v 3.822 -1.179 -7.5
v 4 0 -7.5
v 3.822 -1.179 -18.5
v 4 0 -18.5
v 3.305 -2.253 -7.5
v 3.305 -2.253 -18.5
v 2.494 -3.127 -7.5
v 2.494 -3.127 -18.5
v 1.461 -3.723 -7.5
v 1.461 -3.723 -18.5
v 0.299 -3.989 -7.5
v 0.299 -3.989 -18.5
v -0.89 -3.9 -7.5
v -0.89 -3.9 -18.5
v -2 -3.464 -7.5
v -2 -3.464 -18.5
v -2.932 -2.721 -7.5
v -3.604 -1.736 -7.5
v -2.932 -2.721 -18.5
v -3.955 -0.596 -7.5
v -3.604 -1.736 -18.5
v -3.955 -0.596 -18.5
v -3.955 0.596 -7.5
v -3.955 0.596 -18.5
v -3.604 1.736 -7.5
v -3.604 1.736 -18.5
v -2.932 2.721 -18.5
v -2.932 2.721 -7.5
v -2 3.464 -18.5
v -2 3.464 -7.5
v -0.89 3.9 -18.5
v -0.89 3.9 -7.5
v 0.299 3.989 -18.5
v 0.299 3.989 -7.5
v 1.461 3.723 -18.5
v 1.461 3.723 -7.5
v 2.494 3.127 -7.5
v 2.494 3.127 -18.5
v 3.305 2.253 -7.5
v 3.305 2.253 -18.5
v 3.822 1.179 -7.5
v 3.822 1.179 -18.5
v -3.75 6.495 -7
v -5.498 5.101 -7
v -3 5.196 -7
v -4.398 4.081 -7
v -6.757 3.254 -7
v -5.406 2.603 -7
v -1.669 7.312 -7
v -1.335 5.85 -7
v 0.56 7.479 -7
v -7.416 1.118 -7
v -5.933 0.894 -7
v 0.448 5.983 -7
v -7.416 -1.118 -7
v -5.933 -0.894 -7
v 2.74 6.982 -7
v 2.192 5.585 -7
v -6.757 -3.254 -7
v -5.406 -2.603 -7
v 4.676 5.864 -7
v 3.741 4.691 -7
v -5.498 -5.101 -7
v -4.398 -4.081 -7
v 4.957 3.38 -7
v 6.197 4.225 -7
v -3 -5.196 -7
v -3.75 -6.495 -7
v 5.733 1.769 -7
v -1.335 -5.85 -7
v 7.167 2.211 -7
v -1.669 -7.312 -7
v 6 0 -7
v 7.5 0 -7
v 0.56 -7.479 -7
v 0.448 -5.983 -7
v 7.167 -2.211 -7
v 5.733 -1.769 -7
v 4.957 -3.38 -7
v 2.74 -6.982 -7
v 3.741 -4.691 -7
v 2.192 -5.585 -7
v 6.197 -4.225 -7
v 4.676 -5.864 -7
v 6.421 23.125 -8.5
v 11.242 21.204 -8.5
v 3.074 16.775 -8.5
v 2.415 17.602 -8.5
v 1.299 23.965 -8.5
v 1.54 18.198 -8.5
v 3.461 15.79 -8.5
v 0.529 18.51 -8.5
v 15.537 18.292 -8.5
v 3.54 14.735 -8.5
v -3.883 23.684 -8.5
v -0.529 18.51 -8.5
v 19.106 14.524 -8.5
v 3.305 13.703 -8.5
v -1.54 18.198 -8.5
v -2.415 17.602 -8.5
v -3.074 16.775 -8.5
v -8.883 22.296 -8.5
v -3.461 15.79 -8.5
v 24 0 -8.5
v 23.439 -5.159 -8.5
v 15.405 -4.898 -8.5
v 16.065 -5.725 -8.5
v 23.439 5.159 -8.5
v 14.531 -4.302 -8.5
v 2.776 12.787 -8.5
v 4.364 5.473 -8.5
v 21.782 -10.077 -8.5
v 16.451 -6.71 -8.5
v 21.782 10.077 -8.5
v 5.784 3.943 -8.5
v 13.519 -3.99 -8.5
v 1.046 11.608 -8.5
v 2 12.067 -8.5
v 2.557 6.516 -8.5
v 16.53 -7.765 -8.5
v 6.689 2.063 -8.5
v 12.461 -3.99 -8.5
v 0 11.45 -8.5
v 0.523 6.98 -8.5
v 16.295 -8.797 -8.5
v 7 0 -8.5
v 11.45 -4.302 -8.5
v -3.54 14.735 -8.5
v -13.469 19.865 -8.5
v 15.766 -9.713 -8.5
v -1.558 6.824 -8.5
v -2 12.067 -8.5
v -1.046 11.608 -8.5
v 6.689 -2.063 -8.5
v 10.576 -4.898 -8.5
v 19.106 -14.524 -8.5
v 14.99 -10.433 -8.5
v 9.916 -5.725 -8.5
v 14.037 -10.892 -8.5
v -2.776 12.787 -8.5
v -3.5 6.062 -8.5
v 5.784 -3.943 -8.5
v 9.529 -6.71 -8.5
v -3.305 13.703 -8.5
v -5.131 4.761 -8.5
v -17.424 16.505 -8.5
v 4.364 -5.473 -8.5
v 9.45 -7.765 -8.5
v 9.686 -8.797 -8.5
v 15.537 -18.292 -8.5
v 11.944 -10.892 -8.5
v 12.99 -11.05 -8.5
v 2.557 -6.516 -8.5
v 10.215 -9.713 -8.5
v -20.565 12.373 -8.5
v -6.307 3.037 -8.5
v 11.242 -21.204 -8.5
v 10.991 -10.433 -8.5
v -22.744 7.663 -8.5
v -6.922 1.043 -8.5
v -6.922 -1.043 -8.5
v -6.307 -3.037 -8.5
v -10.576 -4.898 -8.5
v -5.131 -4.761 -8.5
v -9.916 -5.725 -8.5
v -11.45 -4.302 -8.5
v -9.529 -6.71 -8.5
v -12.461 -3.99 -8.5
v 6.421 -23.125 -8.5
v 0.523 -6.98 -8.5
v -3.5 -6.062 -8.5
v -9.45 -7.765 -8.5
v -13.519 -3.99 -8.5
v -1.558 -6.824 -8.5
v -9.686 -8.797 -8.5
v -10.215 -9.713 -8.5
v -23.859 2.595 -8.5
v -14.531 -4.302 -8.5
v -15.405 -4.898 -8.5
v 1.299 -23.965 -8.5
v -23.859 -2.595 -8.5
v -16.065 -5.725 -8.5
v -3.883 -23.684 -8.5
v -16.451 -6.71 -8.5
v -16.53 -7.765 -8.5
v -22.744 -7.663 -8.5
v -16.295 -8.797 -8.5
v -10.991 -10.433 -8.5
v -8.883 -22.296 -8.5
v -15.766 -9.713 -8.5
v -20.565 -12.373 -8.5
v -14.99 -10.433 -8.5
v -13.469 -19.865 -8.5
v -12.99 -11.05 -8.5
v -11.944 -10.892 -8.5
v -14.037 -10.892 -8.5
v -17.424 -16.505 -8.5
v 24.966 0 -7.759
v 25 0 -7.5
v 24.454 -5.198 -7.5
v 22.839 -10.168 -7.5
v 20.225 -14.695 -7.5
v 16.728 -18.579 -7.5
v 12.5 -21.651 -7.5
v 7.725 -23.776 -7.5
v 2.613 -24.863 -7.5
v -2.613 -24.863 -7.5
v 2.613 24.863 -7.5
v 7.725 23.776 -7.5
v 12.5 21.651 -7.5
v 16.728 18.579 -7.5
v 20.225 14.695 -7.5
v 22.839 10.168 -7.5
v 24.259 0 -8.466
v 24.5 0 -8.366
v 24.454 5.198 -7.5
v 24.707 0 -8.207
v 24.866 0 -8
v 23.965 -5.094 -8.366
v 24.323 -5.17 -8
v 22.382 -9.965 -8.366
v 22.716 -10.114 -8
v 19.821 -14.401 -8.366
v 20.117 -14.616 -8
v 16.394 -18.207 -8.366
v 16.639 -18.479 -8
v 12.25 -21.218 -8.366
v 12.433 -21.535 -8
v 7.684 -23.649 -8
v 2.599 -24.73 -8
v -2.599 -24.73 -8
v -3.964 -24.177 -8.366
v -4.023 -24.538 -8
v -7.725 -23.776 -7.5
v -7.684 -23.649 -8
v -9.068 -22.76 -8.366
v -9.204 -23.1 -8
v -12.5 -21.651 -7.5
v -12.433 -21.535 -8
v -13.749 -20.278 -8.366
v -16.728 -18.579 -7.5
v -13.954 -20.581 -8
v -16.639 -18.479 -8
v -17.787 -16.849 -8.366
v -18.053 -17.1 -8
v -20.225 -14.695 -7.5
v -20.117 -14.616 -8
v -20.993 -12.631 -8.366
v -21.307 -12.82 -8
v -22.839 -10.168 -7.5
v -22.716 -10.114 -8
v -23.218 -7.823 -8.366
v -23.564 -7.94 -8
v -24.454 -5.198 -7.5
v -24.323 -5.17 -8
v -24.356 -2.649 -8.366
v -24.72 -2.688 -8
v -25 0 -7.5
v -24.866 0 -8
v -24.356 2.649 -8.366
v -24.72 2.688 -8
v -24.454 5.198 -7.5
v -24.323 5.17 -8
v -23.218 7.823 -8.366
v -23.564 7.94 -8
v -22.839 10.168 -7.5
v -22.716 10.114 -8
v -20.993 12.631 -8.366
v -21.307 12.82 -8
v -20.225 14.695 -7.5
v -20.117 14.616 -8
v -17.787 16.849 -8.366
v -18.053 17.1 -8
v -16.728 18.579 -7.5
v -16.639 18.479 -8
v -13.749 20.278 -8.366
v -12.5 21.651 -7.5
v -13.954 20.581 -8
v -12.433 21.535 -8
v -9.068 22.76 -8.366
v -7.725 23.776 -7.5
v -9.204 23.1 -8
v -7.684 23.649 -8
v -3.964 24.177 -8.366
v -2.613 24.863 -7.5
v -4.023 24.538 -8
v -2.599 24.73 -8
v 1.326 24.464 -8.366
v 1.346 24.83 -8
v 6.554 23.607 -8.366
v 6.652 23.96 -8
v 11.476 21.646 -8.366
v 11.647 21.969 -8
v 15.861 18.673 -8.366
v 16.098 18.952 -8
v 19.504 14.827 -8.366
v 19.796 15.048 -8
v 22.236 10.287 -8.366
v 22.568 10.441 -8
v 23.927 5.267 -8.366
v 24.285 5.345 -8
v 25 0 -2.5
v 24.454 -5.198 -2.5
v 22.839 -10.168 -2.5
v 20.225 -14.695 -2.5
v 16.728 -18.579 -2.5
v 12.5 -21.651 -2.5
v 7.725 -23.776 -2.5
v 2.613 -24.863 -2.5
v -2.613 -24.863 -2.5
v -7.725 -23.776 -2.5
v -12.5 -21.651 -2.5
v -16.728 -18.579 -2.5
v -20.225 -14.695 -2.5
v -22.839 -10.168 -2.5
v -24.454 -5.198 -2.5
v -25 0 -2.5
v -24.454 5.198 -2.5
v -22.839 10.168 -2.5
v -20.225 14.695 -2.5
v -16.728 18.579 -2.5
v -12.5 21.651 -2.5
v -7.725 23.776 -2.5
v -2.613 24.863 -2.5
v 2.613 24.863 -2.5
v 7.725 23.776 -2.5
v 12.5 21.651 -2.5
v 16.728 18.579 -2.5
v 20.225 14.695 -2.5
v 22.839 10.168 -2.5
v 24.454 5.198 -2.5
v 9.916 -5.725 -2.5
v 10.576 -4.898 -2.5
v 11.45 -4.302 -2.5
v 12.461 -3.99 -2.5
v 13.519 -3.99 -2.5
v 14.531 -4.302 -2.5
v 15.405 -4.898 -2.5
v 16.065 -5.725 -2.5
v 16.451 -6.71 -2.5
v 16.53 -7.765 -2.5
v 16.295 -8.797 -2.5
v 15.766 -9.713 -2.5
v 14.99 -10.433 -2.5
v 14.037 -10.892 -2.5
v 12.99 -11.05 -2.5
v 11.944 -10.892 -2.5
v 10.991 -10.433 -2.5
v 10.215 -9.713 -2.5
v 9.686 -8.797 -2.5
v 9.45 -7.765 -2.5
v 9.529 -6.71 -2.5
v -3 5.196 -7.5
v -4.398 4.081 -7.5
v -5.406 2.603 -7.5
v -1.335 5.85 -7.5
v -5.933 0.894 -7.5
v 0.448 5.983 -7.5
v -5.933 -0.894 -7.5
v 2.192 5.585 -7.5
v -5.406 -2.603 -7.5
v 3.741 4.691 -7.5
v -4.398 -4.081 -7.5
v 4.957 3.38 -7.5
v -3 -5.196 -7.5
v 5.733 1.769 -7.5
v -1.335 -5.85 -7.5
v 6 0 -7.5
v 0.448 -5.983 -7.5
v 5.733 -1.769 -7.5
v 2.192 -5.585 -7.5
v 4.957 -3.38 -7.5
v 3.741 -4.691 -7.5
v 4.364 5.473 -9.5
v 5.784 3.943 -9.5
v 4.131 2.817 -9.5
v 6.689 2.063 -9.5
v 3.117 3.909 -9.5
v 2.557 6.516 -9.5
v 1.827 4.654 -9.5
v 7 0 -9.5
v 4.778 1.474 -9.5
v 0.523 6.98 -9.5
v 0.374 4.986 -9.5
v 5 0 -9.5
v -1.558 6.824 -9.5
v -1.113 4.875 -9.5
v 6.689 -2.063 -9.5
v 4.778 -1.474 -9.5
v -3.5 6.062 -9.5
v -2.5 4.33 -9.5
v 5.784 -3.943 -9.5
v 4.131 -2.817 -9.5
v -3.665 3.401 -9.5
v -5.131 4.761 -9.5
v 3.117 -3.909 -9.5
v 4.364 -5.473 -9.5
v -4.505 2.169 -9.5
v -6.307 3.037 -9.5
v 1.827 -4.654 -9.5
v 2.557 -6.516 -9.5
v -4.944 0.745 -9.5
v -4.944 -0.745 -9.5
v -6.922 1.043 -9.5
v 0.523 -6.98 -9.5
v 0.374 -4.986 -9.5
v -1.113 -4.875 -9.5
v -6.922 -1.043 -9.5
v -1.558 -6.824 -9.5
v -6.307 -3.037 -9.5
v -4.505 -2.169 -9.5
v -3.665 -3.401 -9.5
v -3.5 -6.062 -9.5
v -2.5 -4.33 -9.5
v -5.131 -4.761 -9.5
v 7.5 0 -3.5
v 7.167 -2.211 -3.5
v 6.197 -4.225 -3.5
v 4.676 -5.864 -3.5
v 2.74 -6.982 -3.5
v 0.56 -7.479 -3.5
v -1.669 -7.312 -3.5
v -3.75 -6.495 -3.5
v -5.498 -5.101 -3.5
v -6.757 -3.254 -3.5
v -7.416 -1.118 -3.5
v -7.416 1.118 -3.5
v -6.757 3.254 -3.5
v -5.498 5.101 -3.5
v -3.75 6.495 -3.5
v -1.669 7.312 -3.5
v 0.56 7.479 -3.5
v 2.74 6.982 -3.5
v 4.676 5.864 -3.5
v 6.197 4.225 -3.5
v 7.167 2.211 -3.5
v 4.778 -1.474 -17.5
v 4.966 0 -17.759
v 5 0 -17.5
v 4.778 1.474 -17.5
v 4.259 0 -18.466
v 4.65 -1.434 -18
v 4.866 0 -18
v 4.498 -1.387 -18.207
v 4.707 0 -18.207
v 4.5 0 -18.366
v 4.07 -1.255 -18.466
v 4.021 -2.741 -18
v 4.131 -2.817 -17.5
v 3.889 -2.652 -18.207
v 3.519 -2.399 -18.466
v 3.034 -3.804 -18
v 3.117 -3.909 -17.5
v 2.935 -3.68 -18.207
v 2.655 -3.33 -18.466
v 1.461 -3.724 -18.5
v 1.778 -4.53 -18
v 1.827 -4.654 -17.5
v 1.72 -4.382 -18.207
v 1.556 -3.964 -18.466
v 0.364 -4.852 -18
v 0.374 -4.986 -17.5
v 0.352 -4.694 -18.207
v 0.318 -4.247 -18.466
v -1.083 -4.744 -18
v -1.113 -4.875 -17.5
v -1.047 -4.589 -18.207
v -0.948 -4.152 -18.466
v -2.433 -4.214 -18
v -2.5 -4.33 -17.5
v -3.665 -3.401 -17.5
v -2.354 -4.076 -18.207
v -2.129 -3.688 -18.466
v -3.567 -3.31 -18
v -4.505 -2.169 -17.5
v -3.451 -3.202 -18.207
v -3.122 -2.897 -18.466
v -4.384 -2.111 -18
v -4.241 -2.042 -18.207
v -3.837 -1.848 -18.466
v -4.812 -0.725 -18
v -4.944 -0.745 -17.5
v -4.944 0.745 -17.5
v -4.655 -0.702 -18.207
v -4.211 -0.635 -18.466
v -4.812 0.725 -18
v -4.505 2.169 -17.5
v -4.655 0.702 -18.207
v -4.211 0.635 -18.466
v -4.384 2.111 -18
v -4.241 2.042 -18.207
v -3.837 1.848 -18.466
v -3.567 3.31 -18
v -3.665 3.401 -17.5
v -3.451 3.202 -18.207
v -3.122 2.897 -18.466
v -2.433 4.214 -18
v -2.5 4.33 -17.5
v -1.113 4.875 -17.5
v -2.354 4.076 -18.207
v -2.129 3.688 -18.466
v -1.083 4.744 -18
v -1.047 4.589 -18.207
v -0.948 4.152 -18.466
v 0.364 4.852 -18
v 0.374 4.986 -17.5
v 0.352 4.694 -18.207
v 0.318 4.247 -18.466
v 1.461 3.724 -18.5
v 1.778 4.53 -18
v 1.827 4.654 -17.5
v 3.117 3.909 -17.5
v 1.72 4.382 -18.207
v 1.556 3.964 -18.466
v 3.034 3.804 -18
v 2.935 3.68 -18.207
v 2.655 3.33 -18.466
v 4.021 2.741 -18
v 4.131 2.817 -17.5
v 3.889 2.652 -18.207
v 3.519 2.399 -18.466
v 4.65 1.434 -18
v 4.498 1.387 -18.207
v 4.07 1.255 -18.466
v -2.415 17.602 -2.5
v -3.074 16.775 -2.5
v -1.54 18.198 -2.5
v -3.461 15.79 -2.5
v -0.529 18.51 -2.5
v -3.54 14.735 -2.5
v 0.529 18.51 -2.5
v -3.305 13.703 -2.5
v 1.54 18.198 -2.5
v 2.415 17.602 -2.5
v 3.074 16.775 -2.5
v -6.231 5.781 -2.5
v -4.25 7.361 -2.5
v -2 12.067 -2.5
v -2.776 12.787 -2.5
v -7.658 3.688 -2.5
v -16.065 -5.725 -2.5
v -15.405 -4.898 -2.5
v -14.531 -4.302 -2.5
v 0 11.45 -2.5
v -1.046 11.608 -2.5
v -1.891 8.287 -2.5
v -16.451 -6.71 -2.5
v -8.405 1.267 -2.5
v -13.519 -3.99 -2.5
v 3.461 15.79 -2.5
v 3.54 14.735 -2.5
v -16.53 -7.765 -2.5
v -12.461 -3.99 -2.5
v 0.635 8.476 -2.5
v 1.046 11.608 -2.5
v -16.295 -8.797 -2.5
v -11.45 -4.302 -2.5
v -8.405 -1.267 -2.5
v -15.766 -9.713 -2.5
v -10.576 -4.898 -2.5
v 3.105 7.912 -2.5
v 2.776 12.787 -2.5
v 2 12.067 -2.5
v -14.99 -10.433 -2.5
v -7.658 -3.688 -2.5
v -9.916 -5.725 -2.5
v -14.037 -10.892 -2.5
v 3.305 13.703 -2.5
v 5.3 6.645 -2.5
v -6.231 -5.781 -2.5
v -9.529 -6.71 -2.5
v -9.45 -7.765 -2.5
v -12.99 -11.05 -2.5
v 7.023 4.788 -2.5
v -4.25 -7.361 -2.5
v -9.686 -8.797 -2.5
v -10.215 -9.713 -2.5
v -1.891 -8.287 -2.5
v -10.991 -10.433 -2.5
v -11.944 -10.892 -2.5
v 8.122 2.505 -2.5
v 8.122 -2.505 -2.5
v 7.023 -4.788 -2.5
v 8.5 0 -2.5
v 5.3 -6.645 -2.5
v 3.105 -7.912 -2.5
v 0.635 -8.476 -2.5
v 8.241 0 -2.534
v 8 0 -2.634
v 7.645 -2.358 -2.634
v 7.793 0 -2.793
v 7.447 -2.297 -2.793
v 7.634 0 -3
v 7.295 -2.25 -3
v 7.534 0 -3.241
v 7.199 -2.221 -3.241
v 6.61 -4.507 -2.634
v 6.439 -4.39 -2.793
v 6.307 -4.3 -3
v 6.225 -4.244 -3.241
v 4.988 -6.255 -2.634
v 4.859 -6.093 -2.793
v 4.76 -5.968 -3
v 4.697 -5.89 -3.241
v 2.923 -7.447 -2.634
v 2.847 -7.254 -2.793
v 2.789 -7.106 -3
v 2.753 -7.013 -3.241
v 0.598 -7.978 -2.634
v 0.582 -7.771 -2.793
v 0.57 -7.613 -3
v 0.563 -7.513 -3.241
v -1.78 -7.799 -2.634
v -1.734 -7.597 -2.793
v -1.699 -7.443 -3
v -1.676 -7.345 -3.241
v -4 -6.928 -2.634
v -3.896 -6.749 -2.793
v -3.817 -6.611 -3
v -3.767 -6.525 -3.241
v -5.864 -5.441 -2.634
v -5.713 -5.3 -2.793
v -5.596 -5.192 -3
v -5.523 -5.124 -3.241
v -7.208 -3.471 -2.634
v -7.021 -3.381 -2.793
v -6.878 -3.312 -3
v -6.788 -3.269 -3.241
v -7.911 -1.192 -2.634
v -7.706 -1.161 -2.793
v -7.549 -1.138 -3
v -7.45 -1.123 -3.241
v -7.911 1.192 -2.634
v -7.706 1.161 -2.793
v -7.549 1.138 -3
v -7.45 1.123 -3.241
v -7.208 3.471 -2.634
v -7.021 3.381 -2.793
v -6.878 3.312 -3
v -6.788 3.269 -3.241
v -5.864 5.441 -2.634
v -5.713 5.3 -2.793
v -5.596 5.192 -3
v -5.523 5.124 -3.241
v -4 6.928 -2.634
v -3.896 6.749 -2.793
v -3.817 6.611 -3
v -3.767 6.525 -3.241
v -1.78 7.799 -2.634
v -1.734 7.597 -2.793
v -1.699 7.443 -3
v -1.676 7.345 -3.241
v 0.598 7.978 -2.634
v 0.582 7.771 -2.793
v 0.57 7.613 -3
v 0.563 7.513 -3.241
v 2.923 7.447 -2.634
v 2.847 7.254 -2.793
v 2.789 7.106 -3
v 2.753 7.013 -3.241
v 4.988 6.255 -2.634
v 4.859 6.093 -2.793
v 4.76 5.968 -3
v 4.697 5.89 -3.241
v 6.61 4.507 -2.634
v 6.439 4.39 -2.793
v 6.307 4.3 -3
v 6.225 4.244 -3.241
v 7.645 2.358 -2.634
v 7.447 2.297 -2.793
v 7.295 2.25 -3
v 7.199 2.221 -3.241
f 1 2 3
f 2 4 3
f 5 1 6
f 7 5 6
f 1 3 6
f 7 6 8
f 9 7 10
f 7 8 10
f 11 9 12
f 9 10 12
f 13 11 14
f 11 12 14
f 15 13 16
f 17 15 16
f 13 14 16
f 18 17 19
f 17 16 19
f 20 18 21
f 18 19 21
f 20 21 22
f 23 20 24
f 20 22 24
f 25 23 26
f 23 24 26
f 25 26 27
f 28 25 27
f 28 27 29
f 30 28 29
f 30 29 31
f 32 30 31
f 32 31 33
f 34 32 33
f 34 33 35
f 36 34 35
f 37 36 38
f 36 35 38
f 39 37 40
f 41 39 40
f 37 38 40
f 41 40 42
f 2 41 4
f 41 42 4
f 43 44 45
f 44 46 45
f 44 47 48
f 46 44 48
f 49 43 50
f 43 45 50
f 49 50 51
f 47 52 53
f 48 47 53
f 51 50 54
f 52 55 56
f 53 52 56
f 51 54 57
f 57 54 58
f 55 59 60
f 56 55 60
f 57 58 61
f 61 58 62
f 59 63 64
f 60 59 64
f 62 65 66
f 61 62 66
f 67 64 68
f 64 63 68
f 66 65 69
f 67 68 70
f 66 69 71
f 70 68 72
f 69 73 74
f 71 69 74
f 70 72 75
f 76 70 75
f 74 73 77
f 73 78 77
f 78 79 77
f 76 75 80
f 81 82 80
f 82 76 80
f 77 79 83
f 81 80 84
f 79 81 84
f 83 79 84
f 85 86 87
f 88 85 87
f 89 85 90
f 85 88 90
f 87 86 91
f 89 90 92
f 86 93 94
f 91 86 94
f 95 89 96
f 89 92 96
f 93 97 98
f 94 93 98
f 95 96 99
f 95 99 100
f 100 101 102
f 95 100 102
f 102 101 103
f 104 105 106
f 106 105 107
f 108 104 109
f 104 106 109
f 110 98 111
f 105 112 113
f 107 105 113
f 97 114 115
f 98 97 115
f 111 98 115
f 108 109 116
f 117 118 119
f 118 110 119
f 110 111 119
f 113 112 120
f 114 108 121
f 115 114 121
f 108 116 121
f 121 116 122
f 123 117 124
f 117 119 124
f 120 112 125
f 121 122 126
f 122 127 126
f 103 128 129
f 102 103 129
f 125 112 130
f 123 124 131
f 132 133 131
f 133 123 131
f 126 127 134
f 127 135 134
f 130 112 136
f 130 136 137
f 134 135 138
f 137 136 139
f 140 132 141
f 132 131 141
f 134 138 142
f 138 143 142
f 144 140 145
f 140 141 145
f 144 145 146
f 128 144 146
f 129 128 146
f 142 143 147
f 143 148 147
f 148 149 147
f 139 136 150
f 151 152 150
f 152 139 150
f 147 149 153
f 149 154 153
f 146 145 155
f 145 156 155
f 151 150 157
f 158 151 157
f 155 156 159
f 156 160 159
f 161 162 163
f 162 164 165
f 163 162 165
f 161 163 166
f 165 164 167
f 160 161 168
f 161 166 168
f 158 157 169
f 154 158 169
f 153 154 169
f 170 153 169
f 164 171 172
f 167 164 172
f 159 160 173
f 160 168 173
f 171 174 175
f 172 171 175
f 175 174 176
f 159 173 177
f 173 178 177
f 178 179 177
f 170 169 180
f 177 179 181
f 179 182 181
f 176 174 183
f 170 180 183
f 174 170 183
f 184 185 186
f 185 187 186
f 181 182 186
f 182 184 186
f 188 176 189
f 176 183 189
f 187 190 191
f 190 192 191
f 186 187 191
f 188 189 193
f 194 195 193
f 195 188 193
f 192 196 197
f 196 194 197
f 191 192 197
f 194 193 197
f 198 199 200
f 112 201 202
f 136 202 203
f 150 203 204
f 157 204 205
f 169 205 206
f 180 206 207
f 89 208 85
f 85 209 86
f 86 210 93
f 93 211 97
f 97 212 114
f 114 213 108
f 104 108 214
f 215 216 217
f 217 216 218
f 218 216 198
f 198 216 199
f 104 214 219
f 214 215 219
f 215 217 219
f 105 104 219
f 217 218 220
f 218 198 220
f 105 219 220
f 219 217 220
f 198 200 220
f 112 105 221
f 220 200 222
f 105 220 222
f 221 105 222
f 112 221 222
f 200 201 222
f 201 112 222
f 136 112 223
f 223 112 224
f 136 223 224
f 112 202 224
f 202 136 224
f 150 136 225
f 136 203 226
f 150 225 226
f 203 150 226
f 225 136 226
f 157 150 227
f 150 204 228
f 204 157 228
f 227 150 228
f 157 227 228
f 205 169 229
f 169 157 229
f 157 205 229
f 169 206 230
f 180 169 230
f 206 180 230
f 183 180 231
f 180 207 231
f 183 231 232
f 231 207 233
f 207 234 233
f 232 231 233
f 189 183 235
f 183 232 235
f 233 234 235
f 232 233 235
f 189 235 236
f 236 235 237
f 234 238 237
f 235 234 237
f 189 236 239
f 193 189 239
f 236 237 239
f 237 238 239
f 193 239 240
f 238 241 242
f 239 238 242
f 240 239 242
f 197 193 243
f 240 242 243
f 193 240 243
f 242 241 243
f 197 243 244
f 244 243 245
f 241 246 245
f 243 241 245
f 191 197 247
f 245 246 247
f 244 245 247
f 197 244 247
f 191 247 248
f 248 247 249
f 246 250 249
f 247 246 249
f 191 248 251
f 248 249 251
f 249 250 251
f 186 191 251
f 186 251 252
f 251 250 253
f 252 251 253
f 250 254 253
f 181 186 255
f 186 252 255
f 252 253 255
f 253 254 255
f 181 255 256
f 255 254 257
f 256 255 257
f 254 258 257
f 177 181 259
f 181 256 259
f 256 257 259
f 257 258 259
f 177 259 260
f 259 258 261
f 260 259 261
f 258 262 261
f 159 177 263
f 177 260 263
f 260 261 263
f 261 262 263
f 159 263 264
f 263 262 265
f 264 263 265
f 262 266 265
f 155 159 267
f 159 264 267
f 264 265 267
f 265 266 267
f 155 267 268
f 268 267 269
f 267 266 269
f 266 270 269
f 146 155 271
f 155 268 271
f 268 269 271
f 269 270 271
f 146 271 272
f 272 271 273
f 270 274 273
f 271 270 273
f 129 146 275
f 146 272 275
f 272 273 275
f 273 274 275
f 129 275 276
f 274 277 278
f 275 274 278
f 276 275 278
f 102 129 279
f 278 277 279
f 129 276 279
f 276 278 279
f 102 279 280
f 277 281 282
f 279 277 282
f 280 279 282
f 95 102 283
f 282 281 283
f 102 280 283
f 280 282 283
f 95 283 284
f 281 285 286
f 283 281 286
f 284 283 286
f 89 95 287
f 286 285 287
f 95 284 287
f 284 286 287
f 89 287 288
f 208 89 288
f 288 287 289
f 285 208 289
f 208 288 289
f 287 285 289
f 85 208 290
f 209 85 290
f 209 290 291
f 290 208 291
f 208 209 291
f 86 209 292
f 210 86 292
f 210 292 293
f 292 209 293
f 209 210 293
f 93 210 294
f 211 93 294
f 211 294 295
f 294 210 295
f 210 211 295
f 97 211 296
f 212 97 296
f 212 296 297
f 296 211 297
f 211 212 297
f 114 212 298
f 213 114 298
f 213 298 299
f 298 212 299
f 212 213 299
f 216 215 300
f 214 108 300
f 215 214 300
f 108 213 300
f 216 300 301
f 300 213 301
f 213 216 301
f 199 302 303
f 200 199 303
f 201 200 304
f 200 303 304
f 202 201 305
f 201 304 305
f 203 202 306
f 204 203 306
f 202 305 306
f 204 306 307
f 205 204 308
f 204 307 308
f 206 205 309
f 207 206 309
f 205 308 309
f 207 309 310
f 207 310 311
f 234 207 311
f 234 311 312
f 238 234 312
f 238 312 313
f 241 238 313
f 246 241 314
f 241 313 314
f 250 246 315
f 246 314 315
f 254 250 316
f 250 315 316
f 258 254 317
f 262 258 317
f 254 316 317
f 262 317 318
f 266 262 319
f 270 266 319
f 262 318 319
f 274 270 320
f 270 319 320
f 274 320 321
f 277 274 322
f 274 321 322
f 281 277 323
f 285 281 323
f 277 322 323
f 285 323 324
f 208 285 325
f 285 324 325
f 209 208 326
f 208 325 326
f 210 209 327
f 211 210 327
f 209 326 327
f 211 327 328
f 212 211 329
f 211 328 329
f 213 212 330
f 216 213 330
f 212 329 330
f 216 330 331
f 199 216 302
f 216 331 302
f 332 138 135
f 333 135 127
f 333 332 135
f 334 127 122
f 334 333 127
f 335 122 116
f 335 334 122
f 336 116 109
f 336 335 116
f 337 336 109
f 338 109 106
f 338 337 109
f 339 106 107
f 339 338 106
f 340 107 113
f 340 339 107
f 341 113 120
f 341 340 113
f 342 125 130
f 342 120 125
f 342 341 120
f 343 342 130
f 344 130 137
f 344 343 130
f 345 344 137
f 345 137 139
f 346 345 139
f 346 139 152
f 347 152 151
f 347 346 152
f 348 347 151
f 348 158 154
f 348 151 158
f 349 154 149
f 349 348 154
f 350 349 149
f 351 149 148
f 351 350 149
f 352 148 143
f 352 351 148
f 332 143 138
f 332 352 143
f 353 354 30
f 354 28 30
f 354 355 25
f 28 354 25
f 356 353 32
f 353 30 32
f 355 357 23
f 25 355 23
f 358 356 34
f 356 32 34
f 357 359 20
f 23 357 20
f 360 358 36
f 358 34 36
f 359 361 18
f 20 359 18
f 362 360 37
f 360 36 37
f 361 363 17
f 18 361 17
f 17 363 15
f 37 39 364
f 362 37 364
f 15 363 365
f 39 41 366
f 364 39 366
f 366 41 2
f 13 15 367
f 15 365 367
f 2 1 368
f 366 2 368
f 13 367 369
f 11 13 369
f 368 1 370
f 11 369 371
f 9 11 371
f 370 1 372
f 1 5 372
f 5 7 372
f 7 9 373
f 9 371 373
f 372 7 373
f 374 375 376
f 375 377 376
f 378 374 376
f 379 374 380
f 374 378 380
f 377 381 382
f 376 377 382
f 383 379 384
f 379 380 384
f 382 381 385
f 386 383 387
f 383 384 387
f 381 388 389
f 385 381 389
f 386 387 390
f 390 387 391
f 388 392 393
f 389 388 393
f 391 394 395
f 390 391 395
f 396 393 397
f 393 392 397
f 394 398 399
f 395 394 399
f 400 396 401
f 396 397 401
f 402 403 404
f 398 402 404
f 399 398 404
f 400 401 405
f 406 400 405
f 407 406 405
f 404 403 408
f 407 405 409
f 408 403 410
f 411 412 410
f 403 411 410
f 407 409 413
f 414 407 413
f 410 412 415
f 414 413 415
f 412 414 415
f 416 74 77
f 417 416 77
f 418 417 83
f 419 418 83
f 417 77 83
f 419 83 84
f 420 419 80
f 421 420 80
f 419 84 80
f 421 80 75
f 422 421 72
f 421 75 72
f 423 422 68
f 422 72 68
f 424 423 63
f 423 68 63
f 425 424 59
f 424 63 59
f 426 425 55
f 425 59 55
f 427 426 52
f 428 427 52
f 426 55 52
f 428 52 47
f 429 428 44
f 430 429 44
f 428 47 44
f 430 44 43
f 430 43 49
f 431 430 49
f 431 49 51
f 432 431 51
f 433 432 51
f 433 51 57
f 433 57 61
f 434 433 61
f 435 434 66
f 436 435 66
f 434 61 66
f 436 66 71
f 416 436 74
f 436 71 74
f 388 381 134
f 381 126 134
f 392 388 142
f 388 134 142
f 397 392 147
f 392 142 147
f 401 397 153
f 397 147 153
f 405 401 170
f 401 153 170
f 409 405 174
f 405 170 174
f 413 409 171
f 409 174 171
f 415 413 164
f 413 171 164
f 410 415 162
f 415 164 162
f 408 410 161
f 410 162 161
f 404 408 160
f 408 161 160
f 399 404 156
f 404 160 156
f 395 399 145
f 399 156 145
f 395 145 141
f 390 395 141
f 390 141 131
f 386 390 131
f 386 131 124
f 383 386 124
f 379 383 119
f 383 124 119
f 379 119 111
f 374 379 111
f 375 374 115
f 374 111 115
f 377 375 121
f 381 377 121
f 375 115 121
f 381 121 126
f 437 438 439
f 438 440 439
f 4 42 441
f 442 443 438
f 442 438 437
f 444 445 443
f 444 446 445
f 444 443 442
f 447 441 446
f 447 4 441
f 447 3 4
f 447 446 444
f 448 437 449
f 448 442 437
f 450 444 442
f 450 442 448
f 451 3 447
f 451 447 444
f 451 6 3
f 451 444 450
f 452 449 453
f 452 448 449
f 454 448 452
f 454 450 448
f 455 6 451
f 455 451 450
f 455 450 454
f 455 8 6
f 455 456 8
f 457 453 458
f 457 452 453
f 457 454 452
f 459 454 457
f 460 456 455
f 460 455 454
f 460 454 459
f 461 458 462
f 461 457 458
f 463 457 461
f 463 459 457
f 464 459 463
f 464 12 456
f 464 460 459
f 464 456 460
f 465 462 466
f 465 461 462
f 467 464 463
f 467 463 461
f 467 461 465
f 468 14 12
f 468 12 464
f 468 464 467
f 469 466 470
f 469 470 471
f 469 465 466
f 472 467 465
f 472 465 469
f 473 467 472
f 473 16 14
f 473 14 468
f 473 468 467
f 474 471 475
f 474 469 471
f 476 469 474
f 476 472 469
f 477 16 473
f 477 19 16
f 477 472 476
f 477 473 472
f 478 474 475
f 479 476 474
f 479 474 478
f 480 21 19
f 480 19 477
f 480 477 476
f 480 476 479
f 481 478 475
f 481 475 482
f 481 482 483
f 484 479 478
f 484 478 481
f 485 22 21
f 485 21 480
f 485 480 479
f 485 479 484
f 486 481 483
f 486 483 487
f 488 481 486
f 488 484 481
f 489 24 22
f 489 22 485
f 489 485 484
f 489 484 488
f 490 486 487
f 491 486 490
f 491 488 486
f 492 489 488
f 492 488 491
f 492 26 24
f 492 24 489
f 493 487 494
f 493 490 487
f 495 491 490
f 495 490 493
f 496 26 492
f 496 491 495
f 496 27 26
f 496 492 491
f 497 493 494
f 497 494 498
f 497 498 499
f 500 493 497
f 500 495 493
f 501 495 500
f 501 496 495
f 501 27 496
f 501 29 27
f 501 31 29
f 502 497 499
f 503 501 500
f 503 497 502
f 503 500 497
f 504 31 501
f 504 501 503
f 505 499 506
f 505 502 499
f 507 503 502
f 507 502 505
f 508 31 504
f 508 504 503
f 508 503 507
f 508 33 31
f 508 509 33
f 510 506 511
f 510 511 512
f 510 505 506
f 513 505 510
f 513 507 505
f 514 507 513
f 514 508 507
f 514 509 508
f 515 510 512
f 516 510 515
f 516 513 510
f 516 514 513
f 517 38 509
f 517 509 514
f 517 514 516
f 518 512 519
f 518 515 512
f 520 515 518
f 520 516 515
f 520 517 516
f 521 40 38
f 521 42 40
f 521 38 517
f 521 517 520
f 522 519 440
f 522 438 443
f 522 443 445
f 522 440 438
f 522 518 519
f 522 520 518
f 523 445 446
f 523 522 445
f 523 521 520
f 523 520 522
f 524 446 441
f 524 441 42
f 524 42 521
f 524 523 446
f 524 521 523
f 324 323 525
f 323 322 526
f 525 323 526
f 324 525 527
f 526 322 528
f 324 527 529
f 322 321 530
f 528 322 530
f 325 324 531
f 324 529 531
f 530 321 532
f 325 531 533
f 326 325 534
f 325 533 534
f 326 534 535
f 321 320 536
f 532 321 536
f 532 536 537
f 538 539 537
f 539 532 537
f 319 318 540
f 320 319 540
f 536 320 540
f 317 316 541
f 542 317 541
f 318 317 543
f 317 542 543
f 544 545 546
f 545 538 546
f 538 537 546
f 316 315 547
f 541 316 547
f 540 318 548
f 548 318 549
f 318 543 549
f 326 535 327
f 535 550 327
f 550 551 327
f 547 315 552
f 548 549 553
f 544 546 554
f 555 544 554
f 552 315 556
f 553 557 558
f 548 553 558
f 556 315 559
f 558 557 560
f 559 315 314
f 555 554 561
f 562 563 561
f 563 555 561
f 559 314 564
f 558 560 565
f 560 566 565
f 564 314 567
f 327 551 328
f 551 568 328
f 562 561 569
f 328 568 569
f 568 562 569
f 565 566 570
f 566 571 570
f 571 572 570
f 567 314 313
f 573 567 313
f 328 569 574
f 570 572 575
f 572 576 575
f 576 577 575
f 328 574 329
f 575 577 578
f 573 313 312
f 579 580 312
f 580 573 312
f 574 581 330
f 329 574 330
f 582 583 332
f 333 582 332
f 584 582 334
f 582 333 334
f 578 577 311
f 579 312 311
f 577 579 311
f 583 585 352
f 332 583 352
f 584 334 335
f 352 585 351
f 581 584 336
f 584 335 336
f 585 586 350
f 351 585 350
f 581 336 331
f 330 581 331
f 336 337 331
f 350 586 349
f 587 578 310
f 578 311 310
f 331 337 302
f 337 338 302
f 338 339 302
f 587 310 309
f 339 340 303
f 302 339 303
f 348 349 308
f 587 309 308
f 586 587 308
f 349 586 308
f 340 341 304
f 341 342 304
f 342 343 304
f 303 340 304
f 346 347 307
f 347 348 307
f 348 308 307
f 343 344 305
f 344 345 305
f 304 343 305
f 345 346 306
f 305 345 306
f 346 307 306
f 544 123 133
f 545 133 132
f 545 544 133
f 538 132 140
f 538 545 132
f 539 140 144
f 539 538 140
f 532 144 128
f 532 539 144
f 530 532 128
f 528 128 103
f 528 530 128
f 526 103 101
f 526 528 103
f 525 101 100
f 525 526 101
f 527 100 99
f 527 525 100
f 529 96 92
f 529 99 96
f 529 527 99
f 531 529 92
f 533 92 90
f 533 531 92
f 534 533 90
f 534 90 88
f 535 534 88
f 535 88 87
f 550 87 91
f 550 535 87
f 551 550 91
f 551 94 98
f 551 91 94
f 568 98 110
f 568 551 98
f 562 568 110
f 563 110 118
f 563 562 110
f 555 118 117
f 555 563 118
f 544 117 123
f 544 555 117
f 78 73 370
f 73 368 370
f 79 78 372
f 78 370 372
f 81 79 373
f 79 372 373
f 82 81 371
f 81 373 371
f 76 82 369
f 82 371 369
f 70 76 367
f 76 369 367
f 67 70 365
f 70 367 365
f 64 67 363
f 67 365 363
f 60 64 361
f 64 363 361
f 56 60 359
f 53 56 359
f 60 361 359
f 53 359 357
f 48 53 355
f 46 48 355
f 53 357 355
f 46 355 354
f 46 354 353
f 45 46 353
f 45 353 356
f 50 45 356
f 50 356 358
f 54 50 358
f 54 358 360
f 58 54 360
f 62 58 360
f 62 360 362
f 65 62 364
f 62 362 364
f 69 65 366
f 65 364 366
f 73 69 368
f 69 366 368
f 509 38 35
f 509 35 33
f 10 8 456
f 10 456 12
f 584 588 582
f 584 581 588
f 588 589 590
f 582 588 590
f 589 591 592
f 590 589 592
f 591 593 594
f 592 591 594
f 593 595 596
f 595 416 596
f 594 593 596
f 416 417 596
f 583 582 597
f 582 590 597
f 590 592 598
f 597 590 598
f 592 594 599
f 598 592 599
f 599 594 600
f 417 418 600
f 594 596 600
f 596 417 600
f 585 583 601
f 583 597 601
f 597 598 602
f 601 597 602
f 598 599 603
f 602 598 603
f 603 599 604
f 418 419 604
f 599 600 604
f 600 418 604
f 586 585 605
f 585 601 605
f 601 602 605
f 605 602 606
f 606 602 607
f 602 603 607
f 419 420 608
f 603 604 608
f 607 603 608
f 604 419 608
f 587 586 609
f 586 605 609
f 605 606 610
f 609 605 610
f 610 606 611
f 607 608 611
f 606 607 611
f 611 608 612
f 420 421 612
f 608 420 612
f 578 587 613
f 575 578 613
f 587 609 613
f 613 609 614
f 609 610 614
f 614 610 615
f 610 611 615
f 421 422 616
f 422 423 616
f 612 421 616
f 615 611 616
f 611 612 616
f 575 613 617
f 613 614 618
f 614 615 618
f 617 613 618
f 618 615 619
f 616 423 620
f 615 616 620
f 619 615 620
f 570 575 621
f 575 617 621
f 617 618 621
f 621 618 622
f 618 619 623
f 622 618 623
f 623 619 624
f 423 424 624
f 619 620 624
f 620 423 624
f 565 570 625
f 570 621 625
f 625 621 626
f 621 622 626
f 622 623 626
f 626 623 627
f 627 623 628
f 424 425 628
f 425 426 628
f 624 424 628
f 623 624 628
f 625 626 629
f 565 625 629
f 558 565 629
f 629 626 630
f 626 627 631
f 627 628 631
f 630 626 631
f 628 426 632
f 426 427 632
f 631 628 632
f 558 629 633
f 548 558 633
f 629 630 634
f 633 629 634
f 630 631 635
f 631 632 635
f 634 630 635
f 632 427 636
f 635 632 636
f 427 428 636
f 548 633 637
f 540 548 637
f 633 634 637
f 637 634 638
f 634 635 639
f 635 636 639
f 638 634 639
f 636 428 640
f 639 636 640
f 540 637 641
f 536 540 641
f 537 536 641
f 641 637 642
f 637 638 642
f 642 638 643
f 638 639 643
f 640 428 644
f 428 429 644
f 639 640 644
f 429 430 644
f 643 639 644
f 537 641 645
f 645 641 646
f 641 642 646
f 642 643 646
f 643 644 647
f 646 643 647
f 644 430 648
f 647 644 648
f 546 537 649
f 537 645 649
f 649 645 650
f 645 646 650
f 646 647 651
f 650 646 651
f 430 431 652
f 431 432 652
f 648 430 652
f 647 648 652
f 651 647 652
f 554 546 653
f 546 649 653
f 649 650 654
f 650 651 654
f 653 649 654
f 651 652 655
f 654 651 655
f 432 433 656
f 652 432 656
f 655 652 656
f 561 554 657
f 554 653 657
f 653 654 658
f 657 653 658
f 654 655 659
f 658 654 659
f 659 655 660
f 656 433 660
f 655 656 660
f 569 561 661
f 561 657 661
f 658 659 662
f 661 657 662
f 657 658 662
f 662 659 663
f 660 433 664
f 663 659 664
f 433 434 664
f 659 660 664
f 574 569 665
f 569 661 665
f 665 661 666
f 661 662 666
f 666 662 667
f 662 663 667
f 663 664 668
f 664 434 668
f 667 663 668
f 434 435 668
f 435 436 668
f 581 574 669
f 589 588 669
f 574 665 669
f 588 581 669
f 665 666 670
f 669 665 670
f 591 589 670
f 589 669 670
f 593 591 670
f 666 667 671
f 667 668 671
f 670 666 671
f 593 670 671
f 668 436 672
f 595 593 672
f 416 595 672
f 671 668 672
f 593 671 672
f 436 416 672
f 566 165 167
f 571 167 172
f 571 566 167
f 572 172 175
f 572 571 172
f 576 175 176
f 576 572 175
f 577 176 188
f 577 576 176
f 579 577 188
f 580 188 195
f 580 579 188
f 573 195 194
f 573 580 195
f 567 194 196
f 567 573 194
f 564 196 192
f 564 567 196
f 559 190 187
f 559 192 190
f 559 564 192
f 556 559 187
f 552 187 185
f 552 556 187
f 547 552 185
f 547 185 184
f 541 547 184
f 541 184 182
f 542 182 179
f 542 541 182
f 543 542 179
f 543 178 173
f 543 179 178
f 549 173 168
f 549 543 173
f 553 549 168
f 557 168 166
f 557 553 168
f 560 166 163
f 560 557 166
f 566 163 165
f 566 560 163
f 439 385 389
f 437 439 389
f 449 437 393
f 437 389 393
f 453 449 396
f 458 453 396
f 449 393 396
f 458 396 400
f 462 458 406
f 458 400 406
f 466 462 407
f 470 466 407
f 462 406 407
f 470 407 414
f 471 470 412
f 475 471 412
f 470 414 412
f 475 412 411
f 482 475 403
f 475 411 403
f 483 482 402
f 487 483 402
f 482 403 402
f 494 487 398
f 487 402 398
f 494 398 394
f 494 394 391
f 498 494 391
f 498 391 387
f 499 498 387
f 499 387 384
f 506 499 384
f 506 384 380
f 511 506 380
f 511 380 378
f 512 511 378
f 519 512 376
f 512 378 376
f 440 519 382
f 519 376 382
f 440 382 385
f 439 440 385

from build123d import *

# Parameters (mm, degrees)
KREISMUSTER1_COUNT = 3
VERRUNDUNG1_R      = 1


with BuildPart() as part:
    # Skizze2 → Rotation1 (revolve)
    with BuildSketch(Plane(origin=(0, 0, 0), x_dir=(0, 0, -1), z_dir=(1, 0, 0)), mode=Mode.PRIVATE) as rotation1_sk:
        Polygon((9.5, 7), (8.5, 7), (8.5, 25), (2.5, 25), (2.5, 7.5), (7, 7.5), (7, 6), (7.5, 6), (7.5, 4), (18.5, 4), (18.5, 5), (9.5, 5), align=None)
    revolve(rotation1_sk.sketch.rotate(Axis((0, 0, 0), (0, 0, -1)), 90), axis=Axis((0, 0, 0), (0, 0, -1)))

    # Skizze4 → Ø7.1 (7.1) Durchmesser Bohrung1 (revolve, cut)
    with BuildSketch(Plane(origin=(0, 15, -2.5), x_dir=(0, -1, 0), z_dir=(1, 0, 0))):
        Polygon((0, 0), (0, 11.633055198), (3.55, 9.5), (3.55, 0), align=None)
    f_7_1_7_1_durchmesser_bohrung1 = revolve(axis=Axis((0, 15, 3.85), (0, 0, -1)), mode=Mode.SUBTRACT)

    # Kreismuster1: Ø7.1 (7.1) Durchmesser Bohrung1 ×3 about axis
    kreismuster1_axis = Axis((0, 0, 0), (0, 0, 1))
    for i in range(1, KREISMUSTER1_COUNT):
        add(f_7_1_7_1_durchmesser_bohrung1.rotate(kreismuster1_axis, i * 360 / KREISMUSTER1_COUNT), mode=Mode.SUBTRACT)

    # Verrundung1
    verrundung1_edges = [part.edges().sort_by_distance(p)[0] for p in [
        (-25, 0, -8.5),
        (-7.5, 0, -2.5),
        (-5, 0, -18.5),
    ]]
    fillet(verrundung1_edges, radius=VERRUNDUNG1_R - 0.0001)  # a hair under: the kernel refuses the full size


solid = part.part
